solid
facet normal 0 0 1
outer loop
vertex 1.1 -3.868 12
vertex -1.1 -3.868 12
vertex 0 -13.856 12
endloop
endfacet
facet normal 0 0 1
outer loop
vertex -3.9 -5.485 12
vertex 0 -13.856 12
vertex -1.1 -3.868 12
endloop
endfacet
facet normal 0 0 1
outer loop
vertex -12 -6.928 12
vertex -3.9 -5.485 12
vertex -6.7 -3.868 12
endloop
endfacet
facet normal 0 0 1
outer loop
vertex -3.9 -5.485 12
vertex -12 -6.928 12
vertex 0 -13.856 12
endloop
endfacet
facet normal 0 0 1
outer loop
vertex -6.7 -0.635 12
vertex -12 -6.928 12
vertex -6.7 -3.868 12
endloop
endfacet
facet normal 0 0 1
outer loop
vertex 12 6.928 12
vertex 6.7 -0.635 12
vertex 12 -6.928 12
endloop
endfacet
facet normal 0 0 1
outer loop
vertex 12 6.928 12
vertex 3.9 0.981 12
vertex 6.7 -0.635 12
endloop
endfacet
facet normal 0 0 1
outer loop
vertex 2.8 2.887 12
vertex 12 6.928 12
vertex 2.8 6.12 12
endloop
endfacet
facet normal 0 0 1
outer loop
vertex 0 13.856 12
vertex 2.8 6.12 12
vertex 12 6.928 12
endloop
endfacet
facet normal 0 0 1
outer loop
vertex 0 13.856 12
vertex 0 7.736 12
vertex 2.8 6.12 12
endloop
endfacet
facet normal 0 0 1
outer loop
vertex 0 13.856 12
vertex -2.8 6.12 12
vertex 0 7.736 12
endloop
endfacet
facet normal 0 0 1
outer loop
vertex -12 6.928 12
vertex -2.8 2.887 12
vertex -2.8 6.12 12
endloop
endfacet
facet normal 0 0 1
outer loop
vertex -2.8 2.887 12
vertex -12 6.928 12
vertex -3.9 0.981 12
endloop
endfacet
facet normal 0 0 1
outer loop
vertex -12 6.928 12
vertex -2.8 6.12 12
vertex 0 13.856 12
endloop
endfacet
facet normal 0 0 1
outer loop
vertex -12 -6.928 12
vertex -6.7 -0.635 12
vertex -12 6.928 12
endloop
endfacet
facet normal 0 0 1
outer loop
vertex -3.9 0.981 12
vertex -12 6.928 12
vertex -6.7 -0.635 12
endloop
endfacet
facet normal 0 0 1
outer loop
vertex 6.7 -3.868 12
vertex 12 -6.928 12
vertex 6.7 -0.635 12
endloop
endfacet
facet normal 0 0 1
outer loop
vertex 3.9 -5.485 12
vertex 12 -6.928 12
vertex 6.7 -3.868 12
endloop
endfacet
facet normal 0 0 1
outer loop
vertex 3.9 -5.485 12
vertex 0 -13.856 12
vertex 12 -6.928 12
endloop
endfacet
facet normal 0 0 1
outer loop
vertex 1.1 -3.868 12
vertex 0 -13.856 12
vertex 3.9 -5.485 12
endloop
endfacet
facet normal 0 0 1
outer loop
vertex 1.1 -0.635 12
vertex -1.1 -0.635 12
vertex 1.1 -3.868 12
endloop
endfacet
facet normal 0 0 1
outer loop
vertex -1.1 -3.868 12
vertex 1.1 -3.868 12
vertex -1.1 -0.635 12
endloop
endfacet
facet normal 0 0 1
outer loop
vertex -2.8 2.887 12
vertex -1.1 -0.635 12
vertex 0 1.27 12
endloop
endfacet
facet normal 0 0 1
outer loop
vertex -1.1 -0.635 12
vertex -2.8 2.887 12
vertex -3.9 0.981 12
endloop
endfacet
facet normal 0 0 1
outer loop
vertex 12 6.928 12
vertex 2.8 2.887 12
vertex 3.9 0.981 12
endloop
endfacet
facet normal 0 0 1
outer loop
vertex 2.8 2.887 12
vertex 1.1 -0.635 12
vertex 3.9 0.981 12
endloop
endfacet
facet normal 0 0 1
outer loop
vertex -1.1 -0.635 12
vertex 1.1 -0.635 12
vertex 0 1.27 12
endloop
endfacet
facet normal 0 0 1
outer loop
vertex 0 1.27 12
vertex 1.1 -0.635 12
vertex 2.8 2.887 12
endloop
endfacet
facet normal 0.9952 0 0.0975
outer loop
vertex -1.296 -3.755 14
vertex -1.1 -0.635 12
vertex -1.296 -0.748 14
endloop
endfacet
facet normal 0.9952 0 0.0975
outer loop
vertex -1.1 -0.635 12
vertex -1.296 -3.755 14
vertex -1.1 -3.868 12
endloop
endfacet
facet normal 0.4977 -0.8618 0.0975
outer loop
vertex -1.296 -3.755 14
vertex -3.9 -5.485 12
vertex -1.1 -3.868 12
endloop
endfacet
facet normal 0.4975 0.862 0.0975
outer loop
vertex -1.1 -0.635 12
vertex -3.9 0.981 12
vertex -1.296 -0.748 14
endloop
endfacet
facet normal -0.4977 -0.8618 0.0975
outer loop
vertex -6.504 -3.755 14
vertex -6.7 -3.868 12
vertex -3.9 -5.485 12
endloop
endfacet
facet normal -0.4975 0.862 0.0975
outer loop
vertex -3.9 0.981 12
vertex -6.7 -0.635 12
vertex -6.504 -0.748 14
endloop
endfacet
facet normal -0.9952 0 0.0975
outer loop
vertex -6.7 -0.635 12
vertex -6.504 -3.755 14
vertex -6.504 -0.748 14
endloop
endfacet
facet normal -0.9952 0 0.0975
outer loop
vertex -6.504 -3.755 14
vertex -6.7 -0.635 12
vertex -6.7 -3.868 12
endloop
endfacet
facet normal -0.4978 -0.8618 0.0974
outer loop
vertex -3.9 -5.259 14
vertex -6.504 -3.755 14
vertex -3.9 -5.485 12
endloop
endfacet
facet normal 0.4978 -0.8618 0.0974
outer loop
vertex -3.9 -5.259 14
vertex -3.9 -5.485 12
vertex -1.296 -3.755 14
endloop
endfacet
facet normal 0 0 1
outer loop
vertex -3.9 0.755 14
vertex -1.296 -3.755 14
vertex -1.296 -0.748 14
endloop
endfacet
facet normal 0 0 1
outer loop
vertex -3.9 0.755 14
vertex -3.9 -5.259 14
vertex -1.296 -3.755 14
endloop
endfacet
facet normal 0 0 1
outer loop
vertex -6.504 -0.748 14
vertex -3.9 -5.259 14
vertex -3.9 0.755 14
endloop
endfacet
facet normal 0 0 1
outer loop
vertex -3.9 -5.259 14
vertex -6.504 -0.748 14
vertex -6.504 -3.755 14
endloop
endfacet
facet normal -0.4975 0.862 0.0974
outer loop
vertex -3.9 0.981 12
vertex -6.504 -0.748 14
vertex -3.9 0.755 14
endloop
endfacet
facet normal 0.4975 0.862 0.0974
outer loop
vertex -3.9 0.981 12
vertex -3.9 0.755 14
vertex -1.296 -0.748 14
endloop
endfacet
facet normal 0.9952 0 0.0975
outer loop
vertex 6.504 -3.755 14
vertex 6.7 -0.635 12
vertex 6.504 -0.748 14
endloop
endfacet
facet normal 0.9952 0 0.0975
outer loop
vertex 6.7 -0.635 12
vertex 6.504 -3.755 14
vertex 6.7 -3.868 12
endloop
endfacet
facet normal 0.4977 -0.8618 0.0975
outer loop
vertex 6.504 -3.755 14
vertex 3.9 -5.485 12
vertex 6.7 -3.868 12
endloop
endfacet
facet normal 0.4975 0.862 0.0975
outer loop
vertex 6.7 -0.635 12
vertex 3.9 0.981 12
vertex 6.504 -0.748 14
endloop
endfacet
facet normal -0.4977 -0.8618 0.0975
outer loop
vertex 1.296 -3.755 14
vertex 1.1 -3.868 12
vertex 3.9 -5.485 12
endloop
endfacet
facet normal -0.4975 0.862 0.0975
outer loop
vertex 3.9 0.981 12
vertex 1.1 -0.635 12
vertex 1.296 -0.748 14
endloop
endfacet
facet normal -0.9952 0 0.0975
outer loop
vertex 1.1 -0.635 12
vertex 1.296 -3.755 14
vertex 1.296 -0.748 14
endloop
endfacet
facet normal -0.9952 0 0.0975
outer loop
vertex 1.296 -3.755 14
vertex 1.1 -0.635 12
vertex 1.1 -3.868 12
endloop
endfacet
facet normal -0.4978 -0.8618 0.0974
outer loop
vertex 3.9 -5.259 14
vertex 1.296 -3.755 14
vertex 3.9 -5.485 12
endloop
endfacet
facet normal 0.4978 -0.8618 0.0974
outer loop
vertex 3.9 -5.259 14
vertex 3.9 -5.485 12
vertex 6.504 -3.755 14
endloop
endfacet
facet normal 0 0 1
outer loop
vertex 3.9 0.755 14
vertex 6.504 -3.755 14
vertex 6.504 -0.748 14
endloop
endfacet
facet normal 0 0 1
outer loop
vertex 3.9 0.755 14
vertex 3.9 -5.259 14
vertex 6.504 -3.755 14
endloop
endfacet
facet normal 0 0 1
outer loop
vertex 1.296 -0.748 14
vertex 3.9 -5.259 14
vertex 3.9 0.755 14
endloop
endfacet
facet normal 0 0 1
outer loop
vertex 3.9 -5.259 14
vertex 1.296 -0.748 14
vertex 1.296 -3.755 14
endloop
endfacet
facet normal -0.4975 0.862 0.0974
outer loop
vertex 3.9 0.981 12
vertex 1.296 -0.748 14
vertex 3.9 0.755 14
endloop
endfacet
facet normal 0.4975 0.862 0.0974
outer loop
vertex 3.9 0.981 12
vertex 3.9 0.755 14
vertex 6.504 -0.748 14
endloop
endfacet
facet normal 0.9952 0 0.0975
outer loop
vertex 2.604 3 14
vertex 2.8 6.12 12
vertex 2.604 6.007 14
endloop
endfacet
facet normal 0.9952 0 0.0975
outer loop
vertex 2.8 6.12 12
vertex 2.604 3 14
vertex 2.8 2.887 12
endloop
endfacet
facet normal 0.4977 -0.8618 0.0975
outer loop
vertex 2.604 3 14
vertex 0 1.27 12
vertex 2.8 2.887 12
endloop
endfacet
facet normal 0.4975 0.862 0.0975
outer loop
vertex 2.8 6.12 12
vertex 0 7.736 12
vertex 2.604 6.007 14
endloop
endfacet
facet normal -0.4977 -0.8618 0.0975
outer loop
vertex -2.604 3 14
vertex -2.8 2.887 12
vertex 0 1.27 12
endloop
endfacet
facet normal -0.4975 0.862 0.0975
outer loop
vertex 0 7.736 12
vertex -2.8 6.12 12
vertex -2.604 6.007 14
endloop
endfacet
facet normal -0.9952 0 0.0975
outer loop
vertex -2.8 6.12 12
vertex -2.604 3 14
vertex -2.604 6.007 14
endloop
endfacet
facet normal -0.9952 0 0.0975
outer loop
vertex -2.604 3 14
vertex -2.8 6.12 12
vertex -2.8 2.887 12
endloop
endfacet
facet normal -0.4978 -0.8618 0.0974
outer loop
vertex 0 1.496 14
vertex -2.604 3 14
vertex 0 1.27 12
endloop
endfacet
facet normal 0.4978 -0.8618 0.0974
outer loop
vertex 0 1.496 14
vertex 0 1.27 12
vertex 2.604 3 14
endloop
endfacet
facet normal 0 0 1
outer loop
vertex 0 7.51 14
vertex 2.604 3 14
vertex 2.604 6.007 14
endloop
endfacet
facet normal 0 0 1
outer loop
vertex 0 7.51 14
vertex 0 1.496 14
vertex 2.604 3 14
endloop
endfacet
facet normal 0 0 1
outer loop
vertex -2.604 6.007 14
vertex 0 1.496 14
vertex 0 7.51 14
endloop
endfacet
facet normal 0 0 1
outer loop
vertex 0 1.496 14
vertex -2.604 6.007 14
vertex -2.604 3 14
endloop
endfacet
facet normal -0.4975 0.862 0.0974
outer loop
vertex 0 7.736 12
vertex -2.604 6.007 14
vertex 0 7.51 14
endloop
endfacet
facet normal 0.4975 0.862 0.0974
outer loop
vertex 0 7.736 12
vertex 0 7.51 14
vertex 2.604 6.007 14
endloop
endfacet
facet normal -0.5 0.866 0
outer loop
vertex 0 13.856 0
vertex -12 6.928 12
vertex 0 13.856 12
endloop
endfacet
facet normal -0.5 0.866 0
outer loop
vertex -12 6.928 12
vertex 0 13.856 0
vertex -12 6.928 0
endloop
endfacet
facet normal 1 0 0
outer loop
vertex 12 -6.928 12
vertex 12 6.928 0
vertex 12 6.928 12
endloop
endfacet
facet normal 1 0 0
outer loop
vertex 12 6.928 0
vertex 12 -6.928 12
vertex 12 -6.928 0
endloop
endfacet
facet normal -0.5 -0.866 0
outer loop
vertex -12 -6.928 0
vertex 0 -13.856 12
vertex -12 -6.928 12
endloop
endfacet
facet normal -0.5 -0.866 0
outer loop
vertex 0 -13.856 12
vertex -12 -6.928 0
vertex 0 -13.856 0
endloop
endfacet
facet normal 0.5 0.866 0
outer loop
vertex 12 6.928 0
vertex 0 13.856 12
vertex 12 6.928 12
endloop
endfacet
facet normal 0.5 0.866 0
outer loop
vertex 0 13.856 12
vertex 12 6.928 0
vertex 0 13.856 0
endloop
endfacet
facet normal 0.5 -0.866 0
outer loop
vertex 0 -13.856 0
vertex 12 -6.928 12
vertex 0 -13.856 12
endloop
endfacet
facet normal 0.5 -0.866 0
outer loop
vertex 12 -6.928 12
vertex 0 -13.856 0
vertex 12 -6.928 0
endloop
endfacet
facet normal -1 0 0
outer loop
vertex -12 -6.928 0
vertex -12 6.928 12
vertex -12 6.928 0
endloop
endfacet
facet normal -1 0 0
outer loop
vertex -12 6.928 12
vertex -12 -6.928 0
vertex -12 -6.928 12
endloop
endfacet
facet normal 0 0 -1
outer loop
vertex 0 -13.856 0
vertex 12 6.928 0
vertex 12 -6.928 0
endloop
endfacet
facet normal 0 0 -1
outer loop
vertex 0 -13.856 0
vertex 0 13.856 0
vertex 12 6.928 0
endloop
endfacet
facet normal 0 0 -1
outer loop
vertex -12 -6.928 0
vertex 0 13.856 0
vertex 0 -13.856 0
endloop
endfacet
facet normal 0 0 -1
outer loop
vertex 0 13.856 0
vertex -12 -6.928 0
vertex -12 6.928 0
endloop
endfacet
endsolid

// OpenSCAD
// file: lib.scad
// Helpers shared by the parts.
include <params.scad>

// box from corner a to corner b
module box(a, b) {
    translate([min(a[0],b[0]), min(a[1],b[1]), min(a[2],b[2])])
        cube([abs(b[0]-a[0]), abs(b[1]-a[1]), abs(b[2]-a[2])]);
}

// ---- pins ---------------------------------------------------------------
// Pin along +z from z=0: cylinder + conical tip.
module pin() {
    cylinder(d = pin_d, h = pin_len - pin_tip + 0.01);
    translate([0, 0, pin_len - pin_tip])
        cylinder(d1 = pin_d, d2 = 1.0, h = pin_tip);
}

// ---- hex bump --------------------------------------------------------
// Hexagonal bump standing on the XY plane, slight taper for a lead-in.
// Same orientation as the honeycomb cells (rotate(30)), so a plate bump
// drops straight into a cell of the plate above.
module hex_bump(af) {
    r = af / sqrt(3);
    translate([0, 0, -0.3])
        linear_extrude(height = bump_h + 0.3, scale = 0.93) rotate(30) circle(r = r, $fn = 6);
}
module hex_hole(af, t) {
    r = af / sqrt(3);
    translate([0, 0, -1]) linear_extrude(height = t + 2) rotate(30) circle(r = r, $fn = 6);
}
// keep-out rectangle for a hex bump (or hole) in a centred 2D field
function bump_keep(x, y, cx, cy, af = wall_bump_af) = let(r = af / sqrt(3) + b_keep_margin)
    [x - r - cx, y - r - cy, x + r - cx, y + r - cy];

// ---- honeycomb -----------------------------------------------------------
// 2D field of hexagonal holes filling a `size` = [w, h] rectangle centred on
// the origin. Only whole cells are emitted, so the border stays a clean web.
// `keep` lists [x0, y0, x1, y1] rectangles (same frame) no cell may touch.
function hits_keep(cx, cy, r, keep) =
    len([for (k = keep) if (cx + r > k[0] && cx - r < k[2] && cy + r > k[1] && cy - r < k[3]) 1]) > 0;

// `phase` shifts the cell grid so two fields on different parts can share
// one lattice (their cells then line up when assembled).
module hex_holes(size, cell, web, keep = [], phase = [0, 0]) {
    r  = cell / sqrt(3);            // circumradius for across-flats = cell
    dx = cell + web;
    dy = dx * sqrt(3) / 2;
    nx = ceil(size[0] / dx) + 1;
    ny = ceil(size[1] / dy) + 1;
    for (j = [-ny - 1 : ny + 1], i = [-nx - 1 : nx + 1]) {
        cx = i * dx + (j % 2 == 0 ? 0 : dx / 2) + phase[0];
        cy = j * dy + phase[1];
        if (abs(cx) + cell/2 <= size[0]/2 && abs(cy) + r <= size[1]/2
            && !hits_keep(cx, cy, r, keep))
            translate([cx, cy]) rotate(30) circle(r = r, $fn = 6);
    }
}

// Through-cut for a wall: hex field extruded `t` thick, centred on z = 0.
module honeycomb_cut(size, t, cell, web, keep = [], phase = [0, 0]) {
    linear_extrude(height = t, center = true) hex_holes(size, cell, web, keep, phase);
}
// main file
// Foot (print flat, pins up). Four under the bottom bay, pins into three
// neighbouring open cells of its bottom plate.
include <params.scad>
use <accessories.scad>
translate([0, 0, foot_h]) foot();
